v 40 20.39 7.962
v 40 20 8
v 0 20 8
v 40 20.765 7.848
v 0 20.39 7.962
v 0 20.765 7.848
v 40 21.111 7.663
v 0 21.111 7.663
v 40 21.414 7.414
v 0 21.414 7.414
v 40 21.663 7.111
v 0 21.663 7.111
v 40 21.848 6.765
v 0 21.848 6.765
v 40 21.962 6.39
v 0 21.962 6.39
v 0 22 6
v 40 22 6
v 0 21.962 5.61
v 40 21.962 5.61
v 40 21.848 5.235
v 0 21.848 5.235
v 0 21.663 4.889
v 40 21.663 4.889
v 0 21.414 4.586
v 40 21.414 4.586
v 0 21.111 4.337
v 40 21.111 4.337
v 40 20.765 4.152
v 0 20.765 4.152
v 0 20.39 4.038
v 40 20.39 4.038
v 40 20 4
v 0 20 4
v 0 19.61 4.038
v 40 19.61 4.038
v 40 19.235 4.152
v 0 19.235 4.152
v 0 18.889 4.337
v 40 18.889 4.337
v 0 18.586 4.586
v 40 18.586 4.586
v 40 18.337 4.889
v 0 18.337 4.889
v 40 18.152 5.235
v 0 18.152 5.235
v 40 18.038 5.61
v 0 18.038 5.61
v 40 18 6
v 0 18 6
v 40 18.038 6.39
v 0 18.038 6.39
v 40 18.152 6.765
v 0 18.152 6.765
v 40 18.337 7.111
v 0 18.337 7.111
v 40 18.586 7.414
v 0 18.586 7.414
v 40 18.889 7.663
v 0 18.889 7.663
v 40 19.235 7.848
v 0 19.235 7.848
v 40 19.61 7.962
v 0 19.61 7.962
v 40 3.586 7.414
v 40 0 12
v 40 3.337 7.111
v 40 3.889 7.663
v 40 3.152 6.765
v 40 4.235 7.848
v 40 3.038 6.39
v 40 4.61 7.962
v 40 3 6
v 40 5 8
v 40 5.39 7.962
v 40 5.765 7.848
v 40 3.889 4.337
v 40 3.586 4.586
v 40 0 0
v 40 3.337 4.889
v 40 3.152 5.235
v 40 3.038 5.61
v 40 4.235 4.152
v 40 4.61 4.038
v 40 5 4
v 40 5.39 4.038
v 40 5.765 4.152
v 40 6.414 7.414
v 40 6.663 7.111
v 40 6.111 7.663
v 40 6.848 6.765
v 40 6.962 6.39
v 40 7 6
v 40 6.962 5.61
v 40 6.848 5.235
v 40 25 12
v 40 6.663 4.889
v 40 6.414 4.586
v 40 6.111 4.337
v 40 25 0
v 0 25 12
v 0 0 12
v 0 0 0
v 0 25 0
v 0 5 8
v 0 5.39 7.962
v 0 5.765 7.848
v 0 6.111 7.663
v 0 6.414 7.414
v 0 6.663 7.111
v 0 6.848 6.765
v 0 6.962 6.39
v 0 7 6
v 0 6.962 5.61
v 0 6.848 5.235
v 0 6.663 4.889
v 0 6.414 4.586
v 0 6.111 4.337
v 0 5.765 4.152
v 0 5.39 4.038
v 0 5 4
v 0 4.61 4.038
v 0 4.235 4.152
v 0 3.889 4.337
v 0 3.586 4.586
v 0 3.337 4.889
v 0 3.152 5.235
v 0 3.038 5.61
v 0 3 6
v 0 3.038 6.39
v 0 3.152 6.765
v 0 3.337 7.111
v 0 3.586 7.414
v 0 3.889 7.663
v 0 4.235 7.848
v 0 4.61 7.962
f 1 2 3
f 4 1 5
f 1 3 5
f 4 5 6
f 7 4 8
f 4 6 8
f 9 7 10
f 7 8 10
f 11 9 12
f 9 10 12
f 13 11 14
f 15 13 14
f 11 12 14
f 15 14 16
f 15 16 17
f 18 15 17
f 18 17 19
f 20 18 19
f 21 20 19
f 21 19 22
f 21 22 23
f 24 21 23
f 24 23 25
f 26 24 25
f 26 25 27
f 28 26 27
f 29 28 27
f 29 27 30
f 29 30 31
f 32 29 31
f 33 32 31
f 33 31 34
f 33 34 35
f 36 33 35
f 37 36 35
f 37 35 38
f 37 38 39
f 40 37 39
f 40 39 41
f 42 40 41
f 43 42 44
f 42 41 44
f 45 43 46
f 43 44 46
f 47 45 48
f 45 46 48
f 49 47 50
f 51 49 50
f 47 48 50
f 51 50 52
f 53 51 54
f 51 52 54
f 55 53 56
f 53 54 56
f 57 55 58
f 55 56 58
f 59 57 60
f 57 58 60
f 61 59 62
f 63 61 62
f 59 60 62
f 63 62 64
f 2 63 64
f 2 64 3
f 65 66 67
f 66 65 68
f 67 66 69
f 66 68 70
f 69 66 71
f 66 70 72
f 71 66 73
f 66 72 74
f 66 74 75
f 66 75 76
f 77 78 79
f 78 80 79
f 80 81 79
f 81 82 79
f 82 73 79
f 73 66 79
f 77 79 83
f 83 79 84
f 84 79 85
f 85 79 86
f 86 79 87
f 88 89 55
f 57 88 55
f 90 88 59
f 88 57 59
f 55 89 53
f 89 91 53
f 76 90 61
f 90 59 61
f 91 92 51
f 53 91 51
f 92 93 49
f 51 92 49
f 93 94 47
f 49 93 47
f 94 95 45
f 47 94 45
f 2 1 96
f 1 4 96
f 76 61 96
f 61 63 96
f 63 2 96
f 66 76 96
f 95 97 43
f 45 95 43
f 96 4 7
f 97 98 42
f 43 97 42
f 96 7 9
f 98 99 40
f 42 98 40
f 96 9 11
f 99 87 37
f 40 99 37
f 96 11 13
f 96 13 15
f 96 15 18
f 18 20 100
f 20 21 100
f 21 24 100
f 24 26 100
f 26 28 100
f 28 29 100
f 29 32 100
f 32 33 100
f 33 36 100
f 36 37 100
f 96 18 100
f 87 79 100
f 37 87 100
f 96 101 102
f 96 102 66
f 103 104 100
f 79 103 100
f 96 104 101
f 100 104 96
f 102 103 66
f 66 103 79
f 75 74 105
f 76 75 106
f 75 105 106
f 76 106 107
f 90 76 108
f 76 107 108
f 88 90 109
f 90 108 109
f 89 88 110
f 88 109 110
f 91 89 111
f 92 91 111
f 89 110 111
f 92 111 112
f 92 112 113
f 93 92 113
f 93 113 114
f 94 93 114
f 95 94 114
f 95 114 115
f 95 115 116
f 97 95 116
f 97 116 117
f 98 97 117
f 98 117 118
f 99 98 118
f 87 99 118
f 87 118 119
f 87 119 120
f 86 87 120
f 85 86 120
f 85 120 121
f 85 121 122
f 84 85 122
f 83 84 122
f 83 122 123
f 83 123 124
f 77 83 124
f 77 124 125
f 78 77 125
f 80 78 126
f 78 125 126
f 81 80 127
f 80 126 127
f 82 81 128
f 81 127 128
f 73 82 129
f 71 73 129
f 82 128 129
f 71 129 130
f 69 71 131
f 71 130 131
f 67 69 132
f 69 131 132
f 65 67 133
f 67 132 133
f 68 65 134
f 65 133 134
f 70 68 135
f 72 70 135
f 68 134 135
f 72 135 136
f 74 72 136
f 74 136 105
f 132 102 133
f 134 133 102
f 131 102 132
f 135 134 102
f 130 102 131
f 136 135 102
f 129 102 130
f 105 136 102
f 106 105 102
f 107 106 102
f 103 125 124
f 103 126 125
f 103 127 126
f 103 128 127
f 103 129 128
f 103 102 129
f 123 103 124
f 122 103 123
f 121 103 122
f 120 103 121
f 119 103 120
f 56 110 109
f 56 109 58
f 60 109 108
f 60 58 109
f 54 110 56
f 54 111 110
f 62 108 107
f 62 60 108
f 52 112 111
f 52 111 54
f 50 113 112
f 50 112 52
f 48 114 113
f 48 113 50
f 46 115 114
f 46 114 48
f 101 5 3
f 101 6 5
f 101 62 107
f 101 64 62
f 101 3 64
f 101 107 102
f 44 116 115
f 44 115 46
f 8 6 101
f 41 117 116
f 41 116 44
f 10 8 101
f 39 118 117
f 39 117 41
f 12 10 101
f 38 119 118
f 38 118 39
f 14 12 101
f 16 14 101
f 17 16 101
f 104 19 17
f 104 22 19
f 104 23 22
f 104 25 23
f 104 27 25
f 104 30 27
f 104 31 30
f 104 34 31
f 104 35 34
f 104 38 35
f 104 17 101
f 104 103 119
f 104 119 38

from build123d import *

# Parameters (mm, degrees)
ESQUISSE1_W                       = 40
ESQUISSE1_H                       = 25
BOSS_EXTRU_1_DEPTH                = 12
DIAM_TRE_DU_PER_AGE_4_0_4_1_D     = 4
DIAM_TRE_DU_PER_AGE_4_0_4_1_DEPTH = 40


with BuildPart() as part:
    # Esquisse1 → Boss.-Extru.1 (new body)
    with BuildSketch(Plane.XY):
        with Locations((20, 12.5)):
            Rectangle(ESQUISSE1_W, ESQUISSE1_H)
    extrude(amount=BOSS_EXTRU_1_DEPTH)

    # Diamètre du perçage Ø4.0 (4)1
    with Locations(Plane(origin=(40, 0, 0), x_dir=(0, 0, -1), z_dir=(1, 0, 0))):
        with Locations((-6, 20), (-6, 5)):
            Hole(DIAM_TRE_DU_PER_AGE_4_0_4_1_D / 2, depth=DIAM_TRE_DU_PER_AGE_4_0_4_1_DEPTH)


solid = part.part
